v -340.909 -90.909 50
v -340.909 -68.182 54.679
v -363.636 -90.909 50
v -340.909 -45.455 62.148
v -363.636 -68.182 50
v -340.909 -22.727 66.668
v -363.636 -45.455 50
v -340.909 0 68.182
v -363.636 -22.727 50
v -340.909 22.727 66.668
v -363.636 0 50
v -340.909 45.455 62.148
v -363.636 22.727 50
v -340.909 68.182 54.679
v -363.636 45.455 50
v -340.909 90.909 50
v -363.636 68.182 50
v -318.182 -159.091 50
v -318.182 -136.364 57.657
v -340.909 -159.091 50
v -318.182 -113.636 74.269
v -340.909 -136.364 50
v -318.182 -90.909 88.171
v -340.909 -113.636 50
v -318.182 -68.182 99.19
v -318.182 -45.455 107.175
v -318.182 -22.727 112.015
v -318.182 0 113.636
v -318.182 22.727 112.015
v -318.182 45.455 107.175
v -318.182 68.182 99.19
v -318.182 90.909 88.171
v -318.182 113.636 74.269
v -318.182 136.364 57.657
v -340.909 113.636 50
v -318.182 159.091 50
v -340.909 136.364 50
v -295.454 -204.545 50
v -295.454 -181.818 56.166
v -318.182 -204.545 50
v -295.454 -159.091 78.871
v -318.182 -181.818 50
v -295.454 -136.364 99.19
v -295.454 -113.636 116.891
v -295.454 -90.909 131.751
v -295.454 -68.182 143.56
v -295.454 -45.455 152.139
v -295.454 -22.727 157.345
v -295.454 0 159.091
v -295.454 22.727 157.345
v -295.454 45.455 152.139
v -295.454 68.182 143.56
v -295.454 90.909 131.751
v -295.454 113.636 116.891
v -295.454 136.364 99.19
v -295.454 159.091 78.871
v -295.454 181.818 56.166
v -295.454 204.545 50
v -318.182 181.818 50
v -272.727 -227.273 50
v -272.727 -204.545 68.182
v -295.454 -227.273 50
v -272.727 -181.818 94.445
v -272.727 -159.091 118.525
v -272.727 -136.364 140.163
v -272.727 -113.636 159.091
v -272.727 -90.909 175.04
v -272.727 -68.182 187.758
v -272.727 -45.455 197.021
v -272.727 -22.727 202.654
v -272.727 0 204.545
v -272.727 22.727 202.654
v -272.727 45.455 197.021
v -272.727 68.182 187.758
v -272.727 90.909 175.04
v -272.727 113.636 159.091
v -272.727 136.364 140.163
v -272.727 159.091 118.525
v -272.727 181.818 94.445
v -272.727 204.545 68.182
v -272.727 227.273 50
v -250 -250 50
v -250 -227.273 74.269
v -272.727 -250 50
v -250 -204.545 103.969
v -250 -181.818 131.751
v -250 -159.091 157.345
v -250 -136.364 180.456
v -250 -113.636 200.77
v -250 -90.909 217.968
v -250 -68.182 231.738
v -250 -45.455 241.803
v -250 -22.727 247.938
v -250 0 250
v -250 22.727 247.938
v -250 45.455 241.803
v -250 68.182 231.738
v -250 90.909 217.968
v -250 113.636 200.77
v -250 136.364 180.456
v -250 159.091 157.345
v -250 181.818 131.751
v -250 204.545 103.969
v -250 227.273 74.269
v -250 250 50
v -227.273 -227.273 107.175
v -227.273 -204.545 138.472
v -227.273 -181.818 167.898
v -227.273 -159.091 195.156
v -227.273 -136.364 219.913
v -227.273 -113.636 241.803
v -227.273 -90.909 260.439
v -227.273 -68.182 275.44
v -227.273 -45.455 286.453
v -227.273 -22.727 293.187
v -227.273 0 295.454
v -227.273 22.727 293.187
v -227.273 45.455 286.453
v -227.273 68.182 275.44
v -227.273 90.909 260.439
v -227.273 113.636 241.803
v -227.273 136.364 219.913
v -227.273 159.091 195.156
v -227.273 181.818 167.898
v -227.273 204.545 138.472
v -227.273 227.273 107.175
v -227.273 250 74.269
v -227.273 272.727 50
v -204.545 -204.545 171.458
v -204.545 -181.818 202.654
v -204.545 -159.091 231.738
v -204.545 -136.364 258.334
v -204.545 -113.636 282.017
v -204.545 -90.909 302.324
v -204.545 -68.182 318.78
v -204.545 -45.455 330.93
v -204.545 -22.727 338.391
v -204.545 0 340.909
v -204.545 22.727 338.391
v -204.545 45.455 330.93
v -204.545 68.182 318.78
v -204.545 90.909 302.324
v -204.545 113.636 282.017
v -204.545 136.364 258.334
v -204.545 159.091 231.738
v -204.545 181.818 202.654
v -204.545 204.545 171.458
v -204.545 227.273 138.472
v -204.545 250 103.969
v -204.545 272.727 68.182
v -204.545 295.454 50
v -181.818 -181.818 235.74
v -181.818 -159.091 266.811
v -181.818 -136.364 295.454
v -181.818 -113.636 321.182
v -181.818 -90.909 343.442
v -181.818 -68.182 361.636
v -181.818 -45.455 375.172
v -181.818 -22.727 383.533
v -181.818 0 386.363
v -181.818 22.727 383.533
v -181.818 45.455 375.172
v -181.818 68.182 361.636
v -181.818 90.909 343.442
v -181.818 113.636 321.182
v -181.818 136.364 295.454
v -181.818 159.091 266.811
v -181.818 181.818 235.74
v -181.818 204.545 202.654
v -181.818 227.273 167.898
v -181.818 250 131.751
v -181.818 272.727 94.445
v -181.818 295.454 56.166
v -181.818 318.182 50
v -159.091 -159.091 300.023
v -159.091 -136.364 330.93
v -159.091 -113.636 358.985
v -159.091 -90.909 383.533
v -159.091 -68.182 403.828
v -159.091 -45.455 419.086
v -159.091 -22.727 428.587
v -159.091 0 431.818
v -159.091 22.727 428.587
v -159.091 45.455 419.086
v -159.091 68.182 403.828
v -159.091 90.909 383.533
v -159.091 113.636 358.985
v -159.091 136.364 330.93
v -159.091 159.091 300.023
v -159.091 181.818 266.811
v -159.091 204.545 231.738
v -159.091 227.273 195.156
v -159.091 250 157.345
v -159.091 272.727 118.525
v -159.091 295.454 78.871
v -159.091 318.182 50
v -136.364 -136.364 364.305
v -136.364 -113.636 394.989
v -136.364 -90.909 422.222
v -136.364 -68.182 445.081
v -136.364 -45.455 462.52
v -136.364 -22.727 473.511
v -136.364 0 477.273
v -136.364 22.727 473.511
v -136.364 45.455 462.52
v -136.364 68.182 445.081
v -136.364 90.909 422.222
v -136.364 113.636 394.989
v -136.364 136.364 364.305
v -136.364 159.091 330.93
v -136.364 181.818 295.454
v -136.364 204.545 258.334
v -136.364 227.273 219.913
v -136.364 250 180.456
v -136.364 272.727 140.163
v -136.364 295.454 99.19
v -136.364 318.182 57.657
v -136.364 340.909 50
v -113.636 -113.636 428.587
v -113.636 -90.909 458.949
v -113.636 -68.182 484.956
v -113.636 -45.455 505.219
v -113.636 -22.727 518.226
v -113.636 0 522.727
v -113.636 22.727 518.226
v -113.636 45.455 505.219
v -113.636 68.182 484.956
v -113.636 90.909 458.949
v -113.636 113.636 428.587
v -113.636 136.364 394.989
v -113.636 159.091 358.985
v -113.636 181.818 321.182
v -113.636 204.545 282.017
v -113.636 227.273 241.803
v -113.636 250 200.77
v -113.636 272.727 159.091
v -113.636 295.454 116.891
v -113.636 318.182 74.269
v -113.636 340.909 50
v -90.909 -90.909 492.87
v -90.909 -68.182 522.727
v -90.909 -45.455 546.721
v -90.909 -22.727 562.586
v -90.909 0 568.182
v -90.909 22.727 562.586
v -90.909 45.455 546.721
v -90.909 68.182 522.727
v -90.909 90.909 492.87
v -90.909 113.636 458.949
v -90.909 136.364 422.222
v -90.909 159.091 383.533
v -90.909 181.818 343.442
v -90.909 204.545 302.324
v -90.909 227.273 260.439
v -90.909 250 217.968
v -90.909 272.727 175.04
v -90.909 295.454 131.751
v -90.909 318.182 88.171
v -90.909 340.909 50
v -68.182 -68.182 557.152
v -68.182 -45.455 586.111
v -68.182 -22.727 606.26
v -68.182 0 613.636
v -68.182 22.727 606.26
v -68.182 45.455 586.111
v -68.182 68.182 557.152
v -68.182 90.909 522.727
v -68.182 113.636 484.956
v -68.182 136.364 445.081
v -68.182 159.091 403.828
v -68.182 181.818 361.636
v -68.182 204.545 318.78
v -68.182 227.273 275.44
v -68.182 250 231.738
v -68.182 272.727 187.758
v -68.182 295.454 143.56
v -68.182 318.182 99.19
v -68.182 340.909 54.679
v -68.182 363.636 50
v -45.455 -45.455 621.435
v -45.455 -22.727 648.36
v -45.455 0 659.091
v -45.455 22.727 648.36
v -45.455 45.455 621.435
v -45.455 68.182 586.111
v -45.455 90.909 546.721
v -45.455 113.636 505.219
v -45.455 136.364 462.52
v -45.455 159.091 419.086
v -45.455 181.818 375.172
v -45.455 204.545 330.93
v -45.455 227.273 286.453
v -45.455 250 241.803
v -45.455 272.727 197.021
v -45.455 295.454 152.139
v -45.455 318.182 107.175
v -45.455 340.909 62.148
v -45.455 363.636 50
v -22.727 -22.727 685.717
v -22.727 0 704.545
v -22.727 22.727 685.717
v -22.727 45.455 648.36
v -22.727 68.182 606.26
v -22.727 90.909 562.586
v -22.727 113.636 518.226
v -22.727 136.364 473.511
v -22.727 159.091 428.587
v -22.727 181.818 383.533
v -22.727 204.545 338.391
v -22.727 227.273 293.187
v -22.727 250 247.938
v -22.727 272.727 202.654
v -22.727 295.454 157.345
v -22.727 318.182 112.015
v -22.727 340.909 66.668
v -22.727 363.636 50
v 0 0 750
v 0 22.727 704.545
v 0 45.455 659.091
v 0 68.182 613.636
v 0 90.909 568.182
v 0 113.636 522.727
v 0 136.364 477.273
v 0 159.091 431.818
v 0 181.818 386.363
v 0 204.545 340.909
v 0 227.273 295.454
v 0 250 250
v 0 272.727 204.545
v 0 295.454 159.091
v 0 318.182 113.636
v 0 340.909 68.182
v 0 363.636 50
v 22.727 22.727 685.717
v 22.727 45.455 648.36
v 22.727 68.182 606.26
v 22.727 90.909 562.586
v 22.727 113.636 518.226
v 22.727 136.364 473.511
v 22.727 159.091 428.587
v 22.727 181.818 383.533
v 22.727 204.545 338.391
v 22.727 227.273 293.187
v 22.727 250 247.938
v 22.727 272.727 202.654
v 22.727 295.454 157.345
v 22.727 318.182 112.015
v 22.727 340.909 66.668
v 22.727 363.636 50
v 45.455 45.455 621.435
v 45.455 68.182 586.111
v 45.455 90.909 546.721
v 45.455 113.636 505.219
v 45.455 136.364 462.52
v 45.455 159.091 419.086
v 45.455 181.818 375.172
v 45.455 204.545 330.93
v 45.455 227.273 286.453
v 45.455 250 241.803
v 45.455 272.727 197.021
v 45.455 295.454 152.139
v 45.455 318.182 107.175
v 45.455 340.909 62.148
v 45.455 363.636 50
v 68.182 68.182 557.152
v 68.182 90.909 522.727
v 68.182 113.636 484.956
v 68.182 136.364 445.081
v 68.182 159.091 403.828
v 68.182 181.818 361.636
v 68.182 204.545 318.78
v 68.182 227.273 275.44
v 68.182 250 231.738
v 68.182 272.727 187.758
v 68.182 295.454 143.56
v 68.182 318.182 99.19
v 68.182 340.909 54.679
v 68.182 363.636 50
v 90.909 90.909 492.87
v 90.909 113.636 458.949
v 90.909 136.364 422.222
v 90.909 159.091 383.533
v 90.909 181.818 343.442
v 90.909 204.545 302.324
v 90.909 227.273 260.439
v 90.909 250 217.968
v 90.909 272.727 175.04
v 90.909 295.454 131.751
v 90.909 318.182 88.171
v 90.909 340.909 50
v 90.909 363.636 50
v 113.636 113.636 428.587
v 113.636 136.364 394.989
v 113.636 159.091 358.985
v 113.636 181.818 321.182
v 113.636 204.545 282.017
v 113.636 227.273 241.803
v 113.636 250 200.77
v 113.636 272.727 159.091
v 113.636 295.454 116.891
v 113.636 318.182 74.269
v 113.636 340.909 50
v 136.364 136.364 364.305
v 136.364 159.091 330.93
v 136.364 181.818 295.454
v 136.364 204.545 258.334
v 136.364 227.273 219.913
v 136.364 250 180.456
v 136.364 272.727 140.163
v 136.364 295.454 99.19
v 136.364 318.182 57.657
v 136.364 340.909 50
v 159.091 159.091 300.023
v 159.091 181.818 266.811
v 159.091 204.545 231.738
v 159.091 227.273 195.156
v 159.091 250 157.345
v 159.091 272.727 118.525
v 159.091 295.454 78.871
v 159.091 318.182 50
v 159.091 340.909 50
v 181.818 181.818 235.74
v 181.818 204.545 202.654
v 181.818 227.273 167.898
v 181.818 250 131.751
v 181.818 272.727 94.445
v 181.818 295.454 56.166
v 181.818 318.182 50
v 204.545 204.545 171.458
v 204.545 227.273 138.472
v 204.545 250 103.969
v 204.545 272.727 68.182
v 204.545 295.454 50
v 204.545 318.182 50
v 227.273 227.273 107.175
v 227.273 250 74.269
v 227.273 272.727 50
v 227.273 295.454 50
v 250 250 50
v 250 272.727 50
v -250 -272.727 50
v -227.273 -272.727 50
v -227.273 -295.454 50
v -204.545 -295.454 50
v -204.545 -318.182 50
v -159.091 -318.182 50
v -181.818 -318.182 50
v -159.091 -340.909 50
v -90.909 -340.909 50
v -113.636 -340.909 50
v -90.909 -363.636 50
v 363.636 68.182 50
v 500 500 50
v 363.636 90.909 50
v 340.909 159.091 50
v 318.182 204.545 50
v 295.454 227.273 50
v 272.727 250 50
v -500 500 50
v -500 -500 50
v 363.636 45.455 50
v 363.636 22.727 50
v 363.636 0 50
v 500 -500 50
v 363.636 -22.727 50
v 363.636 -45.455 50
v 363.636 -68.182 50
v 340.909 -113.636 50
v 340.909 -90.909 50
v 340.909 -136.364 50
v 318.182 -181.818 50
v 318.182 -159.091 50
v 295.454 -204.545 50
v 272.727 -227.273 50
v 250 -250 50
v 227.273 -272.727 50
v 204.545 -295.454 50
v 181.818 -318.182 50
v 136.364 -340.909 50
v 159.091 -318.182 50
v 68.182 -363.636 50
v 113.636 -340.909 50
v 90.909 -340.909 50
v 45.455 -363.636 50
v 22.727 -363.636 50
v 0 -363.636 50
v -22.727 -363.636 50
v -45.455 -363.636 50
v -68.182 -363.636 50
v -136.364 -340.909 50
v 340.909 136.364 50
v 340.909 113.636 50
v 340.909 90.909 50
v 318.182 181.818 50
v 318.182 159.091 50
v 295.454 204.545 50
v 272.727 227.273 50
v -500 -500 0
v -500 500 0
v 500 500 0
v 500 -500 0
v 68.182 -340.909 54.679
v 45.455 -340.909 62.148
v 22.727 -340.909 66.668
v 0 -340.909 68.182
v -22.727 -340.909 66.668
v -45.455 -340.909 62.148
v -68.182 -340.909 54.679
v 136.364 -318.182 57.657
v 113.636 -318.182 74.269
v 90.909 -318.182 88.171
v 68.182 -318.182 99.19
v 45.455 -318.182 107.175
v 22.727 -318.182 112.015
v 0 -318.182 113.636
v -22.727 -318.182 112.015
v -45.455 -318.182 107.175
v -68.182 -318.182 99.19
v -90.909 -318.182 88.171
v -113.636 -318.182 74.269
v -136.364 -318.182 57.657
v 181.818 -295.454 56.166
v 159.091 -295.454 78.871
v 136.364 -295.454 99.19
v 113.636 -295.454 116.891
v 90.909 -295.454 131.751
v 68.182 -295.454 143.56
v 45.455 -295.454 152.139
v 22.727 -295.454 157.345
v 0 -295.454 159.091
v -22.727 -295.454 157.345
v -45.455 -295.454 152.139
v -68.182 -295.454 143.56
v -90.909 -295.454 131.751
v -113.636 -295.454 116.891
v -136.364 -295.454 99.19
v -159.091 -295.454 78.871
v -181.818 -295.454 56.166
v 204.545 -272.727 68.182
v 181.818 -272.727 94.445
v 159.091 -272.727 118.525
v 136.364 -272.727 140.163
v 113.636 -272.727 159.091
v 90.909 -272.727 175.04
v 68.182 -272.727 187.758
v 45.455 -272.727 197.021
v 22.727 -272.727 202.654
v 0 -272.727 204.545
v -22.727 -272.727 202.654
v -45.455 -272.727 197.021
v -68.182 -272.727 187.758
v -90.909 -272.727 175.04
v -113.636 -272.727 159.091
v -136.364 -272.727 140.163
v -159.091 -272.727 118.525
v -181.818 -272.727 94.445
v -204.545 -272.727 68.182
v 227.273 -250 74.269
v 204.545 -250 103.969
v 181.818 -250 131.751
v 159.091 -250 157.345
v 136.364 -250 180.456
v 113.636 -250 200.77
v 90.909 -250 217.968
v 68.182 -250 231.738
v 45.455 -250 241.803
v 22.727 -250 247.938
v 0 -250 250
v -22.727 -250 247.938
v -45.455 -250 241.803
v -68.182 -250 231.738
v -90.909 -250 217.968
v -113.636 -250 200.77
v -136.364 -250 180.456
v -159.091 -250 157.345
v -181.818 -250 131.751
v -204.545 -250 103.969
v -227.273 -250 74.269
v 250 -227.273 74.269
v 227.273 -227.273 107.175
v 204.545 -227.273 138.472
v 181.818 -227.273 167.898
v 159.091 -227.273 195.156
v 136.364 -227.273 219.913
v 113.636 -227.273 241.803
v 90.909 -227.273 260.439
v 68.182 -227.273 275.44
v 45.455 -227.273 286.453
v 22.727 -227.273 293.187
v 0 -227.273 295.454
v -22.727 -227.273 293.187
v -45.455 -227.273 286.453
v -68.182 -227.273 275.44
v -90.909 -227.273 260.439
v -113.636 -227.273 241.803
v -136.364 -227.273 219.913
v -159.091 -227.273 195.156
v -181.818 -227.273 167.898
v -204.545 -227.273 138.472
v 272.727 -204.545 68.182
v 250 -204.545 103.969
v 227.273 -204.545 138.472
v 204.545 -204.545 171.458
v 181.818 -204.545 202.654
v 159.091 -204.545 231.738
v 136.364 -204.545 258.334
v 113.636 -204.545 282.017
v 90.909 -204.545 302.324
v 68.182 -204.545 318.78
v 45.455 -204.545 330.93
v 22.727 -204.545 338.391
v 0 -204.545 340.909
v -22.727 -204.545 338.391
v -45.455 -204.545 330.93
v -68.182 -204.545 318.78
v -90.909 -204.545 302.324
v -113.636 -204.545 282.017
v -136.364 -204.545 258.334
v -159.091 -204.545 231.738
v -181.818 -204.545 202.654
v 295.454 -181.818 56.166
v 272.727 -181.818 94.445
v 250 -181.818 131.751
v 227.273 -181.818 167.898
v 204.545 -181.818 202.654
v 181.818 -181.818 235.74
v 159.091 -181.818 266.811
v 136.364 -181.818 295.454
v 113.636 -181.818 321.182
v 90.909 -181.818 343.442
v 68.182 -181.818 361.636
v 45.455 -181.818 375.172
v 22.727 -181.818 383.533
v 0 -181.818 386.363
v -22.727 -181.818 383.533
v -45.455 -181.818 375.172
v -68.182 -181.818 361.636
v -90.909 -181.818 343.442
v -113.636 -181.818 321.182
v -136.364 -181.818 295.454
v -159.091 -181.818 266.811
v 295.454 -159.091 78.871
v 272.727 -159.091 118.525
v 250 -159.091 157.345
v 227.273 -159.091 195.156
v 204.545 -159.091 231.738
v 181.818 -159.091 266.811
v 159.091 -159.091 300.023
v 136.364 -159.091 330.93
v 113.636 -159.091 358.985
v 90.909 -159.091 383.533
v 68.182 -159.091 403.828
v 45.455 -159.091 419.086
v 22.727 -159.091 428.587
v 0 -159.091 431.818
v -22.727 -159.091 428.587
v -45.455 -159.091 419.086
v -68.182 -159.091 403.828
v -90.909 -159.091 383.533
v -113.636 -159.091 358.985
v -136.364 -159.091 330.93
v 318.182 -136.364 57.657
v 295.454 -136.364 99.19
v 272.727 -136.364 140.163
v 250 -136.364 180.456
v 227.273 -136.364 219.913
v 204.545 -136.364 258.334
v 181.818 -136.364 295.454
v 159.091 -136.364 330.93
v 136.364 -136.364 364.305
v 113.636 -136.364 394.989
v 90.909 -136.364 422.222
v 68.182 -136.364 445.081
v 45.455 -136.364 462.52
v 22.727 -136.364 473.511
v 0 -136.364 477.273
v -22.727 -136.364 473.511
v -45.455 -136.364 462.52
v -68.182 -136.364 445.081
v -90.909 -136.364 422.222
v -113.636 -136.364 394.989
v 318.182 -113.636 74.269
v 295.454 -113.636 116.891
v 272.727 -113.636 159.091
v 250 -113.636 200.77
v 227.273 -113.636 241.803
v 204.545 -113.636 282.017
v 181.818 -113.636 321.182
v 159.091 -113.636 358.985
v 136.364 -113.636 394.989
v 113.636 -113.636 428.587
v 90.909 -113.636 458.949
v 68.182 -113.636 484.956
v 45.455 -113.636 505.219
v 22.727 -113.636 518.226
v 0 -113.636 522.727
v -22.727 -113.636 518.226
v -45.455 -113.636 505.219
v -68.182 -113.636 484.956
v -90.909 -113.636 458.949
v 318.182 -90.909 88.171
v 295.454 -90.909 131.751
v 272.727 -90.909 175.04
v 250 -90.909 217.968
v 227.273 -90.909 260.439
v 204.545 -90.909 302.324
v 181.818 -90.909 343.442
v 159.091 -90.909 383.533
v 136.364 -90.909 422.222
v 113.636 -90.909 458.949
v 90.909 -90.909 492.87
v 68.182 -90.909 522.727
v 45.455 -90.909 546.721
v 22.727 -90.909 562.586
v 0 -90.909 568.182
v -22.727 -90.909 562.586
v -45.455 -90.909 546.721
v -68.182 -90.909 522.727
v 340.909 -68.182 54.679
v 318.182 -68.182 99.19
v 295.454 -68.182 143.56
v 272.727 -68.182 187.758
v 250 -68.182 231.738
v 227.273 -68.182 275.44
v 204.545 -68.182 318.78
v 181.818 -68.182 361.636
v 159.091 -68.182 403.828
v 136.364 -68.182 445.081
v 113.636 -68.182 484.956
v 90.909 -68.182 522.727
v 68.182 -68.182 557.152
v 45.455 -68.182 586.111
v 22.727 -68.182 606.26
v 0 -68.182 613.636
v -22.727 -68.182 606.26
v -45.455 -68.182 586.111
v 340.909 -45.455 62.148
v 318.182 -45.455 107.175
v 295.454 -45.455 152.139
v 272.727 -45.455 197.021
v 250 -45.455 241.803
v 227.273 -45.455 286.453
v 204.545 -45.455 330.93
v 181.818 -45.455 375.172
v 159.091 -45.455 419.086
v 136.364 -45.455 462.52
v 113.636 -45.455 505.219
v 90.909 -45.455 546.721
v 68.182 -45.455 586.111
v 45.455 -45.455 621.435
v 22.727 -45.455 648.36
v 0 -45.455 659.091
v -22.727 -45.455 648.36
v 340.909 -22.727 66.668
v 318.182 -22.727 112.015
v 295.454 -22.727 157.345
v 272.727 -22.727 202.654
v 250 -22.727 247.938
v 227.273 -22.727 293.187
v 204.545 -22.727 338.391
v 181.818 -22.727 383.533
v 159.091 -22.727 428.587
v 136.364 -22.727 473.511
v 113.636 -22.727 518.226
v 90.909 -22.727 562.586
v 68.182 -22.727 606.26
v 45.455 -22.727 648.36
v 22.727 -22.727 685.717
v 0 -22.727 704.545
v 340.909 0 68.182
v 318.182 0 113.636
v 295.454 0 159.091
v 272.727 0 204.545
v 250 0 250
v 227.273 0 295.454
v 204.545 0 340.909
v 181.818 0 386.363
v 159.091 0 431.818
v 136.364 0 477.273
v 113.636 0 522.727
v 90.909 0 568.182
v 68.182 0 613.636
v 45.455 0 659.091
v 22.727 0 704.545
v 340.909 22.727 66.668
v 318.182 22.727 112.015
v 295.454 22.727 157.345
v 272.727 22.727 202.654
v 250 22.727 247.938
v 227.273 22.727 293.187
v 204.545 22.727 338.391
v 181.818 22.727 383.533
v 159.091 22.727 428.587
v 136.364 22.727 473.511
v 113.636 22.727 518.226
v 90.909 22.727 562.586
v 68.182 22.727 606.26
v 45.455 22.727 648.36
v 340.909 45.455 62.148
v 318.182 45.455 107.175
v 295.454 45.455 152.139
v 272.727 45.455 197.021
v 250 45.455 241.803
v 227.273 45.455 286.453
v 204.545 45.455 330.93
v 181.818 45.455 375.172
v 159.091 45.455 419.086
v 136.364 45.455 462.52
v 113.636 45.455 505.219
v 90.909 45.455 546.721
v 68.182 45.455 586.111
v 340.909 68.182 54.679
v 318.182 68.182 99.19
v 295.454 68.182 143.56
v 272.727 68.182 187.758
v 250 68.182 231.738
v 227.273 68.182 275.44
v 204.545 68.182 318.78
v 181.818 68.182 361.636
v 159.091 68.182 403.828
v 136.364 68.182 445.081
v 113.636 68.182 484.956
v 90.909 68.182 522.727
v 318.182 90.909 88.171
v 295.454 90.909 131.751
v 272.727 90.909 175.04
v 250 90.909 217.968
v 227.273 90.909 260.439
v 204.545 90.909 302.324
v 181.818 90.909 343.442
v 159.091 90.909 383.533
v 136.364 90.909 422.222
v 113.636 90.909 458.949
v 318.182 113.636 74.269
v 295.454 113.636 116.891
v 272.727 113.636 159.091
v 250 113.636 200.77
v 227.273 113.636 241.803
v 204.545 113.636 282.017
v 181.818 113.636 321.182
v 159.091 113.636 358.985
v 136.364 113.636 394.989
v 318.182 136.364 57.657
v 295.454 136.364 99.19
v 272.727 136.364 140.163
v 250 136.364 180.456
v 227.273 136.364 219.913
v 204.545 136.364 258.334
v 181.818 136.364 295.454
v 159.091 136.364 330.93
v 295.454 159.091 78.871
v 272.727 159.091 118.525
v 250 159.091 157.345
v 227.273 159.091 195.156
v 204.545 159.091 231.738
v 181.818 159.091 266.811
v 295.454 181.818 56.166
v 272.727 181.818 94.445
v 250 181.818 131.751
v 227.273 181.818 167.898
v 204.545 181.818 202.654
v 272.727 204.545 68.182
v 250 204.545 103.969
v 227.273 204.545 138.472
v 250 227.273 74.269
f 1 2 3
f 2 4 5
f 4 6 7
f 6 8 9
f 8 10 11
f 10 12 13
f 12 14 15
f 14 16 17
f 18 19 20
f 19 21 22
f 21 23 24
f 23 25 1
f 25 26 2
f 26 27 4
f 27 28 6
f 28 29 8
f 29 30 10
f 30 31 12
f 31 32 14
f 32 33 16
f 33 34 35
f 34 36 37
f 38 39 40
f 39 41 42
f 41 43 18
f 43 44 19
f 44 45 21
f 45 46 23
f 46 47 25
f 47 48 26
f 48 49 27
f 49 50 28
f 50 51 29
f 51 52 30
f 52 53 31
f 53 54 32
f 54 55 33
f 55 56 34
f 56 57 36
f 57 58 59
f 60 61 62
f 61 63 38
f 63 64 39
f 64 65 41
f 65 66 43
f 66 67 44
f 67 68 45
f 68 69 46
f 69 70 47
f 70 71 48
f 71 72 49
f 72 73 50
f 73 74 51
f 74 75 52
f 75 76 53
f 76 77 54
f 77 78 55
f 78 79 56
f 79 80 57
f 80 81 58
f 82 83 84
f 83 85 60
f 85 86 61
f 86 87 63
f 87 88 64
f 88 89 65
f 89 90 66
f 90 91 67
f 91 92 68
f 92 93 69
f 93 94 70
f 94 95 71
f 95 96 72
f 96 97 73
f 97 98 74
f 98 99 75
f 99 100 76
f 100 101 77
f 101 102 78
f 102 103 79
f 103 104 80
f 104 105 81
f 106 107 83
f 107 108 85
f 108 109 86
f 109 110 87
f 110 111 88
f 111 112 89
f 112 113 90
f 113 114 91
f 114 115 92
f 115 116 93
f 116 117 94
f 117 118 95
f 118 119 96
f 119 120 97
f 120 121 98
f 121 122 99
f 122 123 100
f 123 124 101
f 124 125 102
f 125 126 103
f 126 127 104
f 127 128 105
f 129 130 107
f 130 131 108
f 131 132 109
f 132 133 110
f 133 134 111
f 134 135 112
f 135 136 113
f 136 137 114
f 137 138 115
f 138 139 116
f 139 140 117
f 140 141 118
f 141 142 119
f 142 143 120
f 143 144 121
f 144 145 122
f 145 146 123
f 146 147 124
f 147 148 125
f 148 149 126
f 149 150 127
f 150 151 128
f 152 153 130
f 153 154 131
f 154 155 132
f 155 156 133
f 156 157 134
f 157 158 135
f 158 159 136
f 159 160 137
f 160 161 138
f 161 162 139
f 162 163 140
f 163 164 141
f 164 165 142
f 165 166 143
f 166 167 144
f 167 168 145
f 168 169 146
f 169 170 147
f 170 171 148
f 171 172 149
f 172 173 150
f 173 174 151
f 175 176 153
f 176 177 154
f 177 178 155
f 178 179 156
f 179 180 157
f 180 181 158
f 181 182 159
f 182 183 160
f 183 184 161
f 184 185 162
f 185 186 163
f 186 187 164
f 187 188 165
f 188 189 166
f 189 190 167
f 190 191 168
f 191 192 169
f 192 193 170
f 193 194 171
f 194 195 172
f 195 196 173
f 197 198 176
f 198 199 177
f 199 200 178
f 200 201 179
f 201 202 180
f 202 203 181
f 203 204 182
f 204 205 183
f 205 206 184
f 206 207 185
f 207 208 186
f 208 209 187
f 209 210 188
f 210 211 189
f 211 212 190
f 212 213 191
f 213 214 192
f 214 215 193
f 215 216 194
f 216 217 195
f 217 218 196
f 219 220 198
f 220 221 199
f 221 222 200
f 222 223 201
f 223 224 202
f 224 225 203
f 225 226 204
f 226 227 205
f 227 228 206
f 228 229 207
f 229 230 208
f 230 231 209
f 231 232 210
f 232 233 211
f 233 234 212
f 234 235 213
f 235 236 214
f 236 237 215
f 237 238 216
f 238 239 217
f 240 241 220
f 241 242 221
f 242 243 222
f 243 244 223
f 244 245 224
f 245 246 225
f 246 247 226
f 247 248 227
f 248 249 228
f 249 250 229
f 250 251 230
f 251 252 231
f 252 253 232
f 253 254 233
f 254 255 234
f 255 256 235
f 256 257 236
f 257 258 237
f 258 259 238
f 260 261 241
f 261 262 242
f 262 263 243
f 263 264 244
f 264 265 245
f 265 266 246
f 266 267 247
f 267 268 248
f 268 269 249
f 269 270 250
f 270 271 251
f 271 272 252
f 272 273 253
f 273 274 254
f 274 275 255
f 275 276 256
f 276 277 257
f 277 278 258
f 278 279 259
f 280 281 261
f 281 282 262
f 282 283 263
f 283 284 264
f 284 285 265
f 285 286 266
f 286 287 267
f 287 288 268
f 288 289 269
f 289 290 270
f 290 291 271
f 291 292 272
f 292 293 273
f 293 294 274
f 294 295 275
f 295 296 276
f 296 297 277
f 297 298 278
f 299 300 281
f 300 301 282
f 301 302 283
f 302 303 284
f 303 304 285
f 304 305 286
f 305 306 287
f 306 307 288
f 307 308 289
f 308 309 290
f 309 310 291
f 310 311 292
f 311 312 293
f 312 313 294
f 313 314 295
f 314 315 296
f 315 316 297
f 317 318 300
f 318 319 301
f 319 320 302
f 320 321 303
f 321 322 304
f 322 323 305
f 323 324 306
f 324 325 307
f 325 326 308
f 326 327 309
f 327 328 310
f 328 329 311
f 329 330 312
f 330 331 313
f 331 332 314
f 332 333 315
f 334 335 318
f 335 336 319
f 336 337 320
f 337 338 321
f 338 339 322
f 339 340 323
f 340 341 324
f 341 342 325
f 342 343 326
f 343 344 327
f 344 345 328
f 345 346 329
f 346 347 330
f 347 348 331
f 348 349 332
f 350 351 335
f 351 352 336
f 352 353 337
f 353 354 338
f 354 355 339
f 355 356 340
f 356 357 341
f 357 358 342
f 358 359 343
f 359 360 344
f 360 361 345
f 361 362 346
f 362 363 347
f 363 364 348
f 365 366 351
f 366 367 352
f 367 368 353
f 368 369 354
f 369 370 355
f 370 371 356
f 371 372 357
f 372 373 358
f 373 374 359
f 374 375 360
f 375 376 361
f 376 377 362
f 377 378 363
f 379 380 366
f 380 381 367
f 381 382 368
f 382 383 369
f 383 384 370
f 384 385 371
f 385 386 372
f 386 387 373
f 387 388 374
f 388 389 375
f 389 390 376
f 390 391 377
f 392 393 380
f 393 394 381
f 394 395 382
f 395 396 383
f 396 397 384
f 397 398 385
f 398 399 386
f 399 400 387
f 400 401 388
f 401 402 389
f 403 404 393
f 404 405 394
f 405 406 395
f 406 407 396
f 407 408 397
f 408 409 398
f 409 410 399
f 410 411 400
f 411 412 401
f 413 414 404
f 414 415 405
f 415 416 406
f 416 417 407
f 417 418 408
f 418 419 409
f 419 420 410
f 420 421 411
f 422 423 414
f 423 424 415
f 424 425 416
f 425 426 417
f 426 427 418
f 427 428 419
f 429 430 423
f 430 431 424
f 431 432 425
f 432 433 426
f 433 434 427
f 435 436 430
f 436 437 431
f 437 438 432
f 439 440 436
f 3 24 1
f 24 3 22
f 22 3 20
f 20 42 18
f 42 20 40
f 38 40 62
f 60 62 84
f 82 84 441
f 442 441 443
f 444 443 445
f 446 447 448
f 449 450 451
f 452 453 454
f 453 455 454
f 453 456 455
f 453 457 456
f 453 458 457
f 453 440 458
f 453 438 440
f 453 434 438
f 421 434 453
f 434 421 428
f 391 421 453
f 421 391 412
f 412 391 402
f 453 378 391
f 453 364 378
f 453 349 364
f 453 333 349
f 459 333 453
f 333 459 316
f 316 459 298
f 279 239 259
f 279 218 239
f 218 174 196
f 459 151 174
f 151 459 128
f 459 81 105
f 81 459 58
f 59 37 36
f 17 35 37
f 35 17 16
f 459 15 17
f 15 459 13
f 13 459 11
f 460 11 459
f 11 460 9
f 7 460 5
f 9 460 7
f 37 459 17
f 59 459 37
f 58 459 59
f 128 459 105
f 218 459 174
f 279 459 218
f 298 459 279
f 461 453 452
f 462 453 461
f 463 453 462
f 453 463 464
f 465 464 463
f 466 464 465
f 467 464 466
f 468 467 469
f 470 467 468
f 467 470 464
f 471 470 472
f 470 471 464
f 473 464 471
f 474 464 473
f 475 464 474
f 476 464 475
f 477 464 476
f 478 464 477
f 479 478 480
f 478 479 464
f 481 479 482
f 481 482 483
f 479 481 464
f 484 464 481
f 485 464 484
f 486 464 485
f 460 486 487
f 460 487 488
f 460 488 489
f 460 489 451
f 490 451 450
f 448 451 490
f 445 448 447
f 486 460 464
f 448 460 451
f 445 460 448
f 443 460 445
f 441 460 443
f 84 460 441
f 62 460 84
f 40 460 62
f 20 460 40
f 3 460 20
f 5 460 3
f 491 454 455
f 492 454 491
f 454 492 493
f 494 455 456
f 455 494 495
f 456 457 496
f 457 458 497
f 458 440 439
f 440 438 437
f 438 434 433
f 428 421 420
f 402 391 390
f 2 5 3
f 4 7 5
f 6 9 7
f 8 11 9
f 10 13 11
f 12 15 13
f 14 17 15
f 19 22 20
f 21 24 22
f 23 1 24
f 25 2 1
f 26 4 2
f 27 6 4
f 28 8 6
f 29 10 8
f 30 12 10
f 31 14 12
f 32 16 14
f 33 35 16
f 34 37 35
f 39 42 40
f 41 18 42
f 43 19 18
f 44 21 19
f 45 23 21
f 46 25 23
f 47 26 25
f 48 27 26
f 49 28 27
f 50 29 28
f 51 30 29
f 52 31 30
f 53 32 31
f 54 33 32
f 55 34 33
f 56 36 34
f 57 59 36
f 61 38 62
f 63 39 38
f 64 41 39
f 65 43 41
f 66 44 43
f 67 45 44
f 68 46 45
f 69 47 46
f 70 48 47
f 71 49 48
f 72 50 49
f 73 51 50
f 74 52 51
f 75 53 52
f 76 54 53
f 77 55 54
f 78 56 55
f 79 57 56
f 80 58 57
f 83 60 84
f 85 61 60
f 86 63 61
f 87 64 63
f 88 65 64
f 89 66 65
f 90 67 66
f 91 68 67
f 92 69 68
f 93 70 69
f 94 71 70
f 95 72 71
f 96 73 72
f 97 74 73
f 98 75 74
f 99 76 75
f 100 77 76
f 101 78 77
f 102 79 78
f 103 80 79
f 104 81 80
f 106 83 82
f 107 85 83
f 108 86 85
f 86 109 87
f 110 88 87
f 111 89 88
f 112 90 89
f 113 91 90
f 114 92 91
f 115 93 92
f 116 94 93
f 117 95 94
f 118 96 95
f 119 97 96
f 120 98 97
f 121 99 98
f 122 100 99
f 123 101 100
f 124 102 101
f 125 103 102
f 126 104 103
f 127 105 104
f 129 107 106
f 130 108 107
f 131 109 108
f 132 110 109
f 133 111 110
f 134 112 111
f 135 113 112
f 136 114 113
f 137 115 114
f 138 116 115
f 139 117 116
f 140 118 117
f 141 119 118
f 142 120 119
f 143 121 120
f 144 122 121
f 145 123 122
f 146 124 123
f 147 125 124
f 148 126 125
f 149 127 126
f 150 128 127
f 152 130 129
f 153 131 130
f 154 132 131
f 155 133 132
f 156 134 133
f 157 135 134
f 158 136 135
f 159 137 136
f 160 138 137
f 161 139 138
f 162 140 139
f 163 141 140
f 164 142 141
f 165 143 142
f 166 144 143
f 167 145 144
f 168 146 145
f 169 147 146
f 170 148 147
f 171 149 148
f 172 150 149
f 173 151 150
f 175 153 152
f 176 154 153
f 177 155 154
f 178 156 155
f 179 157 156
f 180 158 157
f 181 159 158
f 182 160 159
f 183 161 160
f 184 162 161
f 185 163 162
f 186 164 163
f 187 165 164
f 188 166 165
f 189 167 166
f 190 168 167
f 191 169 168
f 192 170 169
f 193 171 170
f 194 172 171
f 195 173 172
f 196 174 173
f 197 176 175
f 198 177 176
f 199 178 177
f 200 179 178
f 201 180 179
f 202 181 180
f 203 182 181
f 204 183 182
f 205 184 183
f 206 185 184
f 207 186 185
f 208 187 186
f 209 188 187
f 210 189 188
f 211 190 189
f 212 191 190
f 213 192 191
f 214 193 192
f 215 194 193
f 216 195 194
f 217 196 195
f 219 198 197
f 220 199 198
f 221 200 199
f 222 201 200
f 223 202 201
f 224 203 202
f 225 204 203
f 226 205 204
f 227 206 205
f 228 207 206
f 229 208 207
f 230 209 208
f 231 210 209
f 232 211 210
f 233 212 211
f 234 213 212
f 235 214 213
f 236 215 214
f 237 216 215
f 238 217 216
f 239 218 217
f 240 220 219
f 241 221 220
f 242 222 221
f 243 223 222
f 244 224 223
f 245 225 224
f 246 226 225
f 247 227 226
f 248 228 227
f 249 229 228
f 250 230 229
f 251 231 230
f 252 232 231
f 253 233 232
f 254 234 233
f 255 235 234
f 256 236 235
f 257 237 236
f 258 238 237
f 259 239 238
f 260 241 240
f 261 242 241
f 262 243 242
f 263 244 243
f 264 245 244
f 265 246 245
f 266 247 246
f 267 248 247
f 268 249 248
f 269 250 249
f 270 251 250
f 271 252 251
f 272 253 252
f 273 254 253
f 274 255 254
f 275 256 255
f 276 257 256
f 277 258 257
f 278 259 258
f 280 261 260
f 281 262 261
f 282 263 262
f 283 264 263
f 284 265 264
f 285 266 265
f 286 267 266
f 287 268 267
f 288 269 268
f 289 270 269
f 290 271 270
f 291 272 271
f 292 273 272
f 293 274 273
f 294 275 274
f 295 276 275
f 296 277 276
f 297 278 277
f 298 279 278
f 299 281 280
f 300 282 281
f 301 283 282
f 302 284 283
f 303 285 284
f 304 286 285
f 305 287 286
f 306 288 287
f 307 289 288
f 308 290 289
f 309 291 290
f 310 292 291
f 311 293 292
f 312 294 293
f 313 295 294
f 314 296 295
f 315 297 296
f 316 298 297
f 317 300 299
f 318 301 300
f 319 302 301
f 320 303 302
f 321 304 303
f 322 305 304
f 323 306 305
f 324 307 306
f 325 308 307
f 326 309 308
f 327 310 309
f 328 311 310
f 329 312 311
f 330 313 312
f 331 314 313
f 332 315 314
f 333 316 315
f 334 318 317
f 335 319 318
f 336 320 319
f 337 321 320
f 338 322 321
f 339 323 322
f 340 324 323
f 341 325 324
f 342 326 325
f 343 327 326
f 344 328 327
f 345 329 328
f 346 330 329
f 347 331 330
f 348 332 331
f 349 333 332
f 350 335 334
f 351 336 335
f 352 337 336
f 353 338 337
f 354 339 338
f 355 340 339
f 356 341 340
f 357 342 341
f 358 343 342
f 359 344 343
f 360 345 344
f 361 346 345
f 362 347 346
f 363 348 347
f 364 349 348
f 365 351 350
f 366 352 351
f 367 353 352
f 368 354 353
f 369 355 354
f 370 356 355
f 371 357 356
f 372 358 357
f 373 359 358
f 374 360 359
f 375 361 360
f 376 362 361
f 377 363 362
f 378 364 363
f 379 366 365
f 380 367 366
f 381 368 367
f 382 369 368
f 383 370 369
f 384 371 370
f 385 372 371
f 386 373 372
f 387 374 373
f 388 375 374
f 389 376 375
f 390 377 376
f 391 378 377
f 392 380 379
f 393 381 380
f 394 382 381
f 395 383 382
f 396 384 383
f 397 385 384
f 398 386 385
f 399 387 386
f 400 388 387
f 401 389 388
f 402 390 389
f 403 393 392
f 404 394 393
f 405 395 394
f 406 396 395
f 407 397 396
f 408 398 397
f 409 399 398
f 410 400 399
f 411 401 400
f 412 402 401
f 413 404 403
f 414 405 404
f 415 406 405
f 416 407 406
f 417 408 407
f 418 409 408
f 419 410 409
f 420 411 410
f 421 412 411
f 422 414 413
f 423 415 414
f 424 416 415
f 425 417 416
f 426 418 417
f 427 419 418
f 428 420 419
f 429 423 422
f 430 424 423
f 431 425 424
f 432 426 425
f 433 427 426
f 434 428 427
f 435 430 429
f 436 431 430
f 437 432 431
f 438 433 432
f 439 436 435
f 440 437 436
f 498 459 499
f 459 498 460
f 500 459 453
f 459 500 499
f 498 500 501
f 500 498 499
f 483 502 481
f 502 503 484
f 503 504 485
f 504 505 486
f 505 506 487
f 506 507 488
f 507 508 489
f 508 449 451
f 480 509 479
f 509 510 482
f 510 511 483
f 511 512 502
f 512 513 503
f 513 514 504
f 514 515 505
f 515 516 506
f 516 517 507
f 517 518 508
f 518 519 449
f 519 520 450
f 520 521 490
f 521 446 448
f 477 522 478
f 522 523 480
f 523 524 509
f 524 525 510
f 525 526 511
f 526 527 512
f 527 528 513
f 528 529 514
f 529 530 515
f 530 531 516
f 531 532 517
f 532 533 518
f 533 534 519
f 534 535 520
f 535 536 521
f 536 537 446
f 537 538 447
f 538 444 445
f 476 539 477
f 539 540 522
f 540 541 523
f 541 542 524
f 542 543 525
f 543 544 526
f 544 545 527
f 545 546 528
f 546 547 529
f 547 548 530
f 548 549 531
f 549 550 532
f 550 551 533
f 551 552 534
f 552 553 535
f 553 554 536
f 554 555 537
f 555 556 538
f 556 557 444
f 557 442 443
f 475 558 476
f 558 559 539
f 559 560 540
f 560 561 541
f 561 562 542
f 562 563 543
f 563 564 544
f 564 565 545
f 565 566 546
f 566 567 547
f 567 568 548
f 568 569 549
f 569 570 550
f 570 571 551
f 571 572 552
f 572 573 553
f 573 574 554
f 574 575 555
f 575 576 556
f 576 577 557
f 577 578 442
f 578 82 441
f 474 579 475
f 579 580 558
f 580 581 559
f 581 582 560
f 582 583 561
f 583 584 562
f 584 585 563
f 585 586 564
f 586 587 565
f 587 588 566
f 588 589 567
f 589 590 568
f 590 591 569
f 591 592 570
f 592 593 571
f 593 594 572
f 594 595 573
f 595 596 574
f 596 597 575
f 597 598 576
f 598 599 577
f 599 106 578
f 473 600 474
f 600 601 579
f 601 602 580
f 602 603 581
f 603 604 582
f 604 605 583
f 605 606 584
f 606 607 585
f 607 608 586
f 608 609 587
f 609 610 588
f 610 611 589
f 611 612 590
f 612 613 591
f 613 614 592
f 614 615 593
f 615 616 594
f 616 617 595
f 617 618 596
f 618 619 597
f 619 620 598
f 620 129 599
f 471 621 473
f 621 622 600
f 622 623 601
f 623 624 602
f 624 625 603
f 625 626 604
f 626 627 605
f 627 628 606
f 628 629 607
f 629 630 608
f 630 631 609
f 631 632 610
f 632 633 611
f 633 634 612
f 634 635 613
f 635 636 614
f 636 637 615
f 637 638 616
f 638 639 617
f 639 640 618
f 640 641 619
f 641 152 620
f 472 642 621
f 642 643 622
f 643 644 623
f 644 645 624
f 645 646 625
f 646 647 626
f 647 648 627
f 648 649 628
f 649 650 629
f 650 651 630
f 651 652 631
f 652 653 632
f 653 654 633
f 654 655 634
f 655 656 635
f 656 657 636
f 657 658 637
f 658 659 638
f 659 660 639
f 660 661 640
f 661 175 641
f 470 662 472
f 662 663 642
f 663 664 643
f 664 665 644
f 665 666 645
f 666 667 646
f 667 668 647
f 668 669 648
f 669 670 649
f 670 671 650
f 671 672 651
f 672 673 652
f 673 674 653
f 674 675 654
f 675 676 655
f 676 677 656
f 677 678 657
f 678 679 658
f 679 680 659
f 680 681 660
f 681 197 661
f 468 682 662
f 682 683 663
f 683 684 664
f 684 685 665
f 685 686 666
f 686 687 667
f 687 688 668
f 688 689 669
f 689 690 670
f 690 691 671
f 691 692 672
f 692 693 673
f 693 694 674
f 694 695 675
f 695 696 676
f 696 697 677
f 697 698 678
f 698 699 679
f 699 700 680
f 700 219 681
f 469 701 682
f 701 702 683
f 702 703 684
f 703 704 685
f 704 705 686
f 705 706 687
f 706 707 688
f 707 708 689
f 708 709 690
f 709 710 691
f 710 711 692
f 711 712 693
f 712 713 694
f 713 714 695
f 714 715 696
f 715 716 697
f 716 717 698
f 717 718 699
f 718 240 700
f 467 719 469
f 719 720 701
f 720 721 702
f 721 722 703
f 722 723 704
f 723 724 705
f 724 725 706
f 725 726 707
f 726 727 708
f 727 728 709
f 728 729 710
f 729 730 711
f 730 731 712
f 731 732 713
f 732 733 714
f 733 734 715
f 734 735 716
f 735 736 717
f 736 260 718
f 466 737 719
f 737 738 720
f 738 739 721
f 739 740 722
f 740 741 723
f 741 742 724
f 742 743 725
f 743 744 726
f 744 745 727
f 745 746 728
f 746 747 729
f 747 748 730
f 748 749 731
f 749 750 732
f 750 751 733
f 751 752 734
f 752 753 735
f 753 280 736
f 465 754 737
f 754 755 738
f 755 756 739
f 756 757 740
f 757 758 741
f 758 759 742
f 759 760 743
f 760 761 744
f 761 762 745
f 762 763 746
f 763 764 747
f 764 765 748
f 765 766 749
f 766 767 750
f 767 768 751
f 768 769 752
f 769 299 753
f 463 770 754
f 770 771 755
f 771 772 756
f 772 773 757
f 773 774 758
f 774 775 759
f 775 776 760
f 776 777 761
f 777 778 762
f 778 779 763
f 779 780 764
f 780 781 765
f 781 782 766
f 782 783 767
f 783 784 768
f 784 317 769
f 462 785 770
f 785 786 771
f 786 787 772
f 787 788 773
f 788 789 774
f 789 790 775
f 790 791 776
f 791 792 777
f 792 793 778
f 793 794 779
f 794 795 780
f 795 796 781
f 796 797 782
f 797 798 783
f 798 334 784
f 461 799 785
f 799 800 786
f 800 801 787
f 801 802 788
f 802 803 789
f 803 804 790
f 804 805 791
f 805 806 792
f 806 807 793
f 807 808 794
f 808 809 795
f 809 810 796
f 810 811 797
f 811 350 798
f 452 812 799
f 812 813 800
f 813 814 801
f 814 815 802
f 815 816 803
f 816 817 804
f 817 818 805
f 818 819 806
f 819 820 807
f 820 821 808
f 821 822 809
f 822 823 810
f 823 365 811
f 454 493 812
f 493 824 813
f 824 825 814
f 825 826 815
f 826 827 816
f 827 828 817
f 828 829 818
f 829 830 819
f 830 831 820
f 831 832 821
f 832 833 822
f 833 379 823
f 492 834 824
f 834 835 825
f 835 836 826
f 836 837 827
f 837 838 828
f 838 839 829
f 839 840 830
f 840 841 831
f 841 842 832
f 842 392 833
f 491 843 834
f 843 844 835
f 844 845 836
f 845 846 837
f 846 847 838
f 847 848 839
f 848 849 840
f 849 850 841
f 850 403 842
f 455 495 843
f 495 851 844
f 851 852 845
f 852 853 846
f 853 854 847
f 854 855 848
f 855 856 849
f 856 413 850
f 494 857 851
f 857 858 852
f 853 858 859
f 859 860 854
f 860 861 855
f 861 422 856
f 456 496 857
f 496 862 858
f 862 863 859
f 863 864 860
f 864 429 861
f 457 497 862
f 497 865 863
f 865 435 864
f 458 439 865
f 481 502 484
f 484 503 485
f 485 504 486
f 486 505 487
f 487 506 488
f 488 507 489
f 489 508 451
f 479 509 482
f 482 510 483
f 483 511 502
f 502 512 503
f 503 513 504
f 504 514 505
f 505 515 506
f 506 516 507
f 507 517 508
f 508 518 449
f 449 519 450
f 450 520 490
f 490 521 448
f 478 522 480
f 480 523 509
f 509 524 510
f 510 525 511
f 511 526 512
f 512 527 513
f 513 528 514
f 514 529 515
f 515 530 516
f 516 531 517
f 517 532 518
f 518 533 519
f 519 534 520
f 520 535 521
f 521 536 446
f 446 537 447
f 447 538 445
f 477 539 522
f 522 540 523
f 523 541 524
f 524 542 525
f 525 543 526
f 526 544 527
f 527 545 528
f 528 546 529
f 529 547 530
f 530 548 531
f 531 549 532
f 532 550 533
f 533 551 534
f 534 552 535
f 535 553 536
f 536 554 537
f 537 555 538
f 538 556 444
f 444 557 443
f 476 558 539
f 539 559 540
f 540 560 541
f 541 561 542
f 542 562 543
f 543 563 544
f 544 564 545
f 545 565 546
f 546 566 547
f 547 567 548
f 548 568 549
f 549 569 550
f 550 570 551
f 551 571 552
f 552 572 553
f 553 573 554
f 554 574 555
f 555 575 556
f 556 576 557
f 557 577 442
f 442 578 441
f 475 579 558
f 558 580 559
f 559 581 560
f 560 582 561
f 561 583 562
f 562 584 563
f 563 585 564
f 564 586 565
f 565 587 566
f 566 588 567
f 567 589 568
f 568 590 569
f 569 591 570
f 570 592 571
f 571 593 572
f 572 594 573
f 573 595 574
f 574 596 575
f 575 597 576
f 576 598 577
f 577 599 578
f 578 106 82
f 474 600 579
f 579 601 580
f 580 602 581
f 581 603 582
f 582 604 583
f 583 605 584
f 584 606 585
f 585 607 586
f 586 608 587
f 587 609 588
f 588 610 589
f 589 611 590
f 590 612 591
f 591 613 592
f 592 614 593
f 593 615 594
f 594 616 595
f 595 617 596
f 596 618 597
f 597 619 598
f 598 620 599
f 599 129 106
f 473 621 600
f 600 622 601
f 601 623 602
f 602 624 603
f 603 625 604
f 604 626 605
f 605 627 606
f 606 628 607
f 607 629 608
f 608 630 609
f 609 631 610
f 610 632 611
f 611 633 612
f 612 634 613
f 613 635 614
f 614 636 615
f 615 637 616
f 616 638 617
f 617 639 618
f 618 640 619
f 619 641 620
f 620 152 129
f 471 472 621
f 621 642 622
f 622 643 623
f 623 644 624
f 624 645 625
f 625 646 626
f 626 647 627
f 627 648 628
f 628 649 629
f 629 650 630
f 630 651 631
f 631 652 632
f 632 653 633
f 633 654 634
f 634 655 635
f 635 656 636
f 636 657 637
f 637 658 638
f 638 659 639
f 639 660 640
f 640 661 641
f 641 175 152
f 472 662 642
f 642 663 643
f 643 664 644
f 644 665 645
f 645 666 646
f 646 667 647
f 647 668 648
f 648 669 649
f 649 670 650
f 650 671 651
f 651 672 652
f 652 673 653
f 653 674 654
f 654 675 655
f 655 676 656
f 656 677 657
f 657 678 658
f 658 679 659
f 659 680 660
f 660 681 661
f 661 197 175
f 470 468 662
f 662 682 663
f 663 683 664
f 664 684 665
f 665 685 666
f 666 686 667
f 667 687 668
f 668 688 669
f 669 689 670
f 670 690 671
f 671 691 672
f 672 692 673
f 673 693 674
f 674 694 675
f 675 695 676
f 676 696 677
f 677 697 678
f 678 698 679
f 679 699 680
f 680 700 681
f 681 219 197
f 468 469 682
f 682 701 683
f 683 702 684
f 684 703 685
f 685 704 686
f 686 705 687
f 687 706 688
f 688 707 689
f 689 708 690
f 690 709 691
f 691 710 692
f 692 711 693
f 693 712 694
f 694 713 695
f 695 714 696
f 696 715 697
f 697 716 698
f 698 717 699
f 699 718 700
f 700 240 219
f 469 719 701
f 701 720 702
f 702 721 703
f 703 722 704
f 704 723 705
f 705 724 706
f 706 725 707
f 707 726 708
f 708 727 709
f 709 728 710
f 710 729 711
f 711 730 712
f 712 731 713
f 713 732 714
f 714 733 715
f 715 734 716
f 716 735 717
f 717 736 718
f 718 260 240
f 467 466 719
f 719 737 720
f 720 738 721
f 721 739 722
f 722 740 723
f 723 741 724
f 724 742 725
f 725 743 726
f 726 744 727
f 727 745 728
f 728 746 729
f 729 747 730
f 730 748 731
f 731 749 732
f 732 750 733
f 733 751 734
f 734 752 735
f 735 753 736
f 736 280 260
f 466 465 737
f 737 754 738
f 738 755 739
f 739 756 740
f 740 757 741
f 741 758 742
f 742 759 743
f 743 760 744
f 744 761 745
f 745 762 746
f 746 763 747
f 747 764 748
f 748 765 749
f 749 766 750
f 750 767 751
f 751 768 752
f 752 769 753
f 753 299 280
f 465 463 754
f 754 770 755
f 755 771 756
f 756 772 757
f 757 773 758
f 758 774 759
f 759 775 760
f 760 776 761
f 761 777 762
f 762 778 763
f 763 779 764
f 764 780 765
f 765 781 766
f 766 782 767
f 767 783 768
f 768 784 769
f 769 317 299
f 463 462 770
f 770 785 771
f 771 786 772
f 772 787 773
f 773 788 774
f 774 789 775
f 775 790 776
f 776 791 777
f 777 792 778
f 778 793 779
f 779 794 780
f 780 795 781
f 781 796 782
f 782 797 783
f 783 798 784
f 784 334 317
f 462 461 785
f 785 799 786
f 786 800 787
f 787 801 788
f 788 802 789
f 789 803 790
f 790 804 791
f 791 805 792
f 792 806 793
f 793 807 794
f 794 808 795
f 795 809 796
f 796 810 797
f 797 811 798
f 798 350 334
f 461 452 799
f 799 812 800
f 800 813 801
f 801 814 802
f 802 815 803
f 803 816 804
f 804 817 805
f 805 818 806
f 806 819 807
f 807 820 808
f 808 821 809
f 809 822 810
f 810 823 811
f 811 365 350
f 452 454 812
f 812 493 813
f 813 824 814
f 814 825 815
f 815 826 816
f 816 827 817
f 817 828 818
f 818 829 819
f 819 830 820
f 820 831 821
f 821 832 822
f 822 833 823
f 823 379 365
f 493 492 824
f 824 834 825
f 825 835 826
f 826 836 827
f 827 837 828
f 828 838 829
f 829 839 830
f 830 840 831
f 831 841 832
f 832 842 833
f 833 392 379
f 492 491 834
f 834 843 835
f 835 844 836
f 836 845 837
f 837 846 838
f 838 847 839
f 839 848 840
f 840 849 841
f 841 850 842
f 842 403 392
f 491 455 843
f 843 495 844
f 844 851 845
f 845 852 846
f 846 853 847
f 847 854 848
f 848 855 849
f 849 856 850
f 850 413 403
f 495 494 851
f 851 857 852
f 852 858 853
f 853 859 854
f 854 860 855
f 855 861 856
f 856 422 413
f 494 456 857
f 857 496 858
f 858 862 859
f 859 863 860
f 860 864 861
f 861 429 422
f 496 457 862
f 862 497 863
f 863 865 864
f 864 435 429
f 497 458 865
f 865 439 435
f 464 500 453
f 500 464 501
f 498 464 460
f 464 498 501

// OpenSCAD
///////////////////////////////////////////////////////////////////
//
// plot
// ====
//
// This module draws a polyhedron mapping a function greater than zero.
// The domain of the function may be either a triangle or a quadrilateral.
// The function is evaluated in a triangular grid of points inside its domain 
// and its graph is ploted. 
//
//    module plot(m,p0,p1,p2,p3=undef,conv=10)
//
// where the parameters are:
//
//    m         - the approximate number of points in the grid for each
//                triangular domain; quadrilaterals will have 2*m points
//    p0,p1,p2  - the three 2D points of the triangular domain
//    p3        - the third point of a second triangular domain (p0,p2,p3);
//                if p3 is undef, just the first triangular domain is used
//    conv      - convexity parameter of the polihedra
//
// The module requires an external function to be plotted:
//
//    function map_to_plot(x,y)
//
// which should return either a real value or undef for each real x and y. 
//
////////////////////////////////////////////////////////////////////

module plot(m, p0, p1, p2, p3=undef, conv=10){
  
  N = ceil( sqrt( 2 * m) - 3/2 );
  
  // the main task
  union(){
    plot_tri(p0, p1, p2);
    if (p3 != undef)
      plot_tri(p0, p2, p3);
  }
  
 // module to plot in a triangular domain
  module plot_tri(p0, p1, p2) {
    
    // the three domain points should be in anti-clockwise order
    A =  p0;
    B = (p1-p0) * (p2-p0) < 0 ? p2 : p1;
    C = (B==p1) ? p2 : p1;
    
    // the indexed points in the grid
    function meshPoint(i,j) = A*i/N + B*j/N + C*(N-i-j)/N;

    // functions to enumerate the points with defined values of the map_to_plot
    function shrinked(a) = 
      [for (i=[0:N], j=[0:N-i]) if(a[i][j][2] != undef) a[i][j] ];
        
    function enum(a) = let(b = shrinked(a))
      [for (i=[0:N]) 
        [ for (j=[0:N-i])
          (a[i][j][2] != undef)? 
            [for ( k = search(a[i][j], b, 0)[0]) if (a[i][j] == b[k]) k ][0]:
            undef
      ]];
  
     // the vertices in the grid
    map = [ for (i=[0:N])
          [ for (j=[0:N-i])
            let(x = meshPoint(i,j)[0], y = meshPoint(i,j)[1])
              [ x, y, map_to_plot(x,y)] 
          ]];

    emap = enum(map);
          
    // the points in the top of the plot
    toppts = [ for(i=[0:N], j=[0:N-i])  if(emap[i][j] != undef) map[i][j] ];

    // the points in the base of the plot
    botpts = [ for (pts = toppts)[ pts[0], pts[1], 0 ] ];
      
    // the faces in the top of the plot
    top_tri_faces = 
      concat( 
        [for(i=[1:N], j=[0:N-i]) 
          if( (emap[i][j]   !=undef) && 
              (emap[i-1][j] !=undef) && 
              (emap[i][j-1] !=undef) ) 
                [ emap[i][j], emap[i][j-1], emap[i-1][j] ]],

        [for(i=[0:N-1], j=[0:N-i]) 
          if( (emap[i][j]     !=undef) && 
              (emap[i][j-1]   !=undef) && 
              (emap[i+1][j-1] !=undef)) 
                [ emap[i][j], emap[i+1][j-1], emap[i][j-1] ]] 
       );
          
    // the faces in the base of the plot
    base_tri_faces = let(k = len(toppts))
        [ for(face = top_tri_faces) [ face[1]+k, face[0]+k, face[2]+k ] ];

    // enumeration of the vertices of vertical quadrilateral faces of the plot
    // faces with constant j :   10 00 1-1 01 
    function side_faces1(a) = let (k = len(toppts))
        [for(i=[0:N-1], j=[0:N-i])
          let (p = (a[ i ][ j ] != undef) && (a[i+1][ j ] != undef),
               q = (a[i+1][j-1] == undef) && (a[ i ][j+1] != undef),
               r = (a[i+1][j-1] != undef) && (a[ i ][j+1] == undef) )
          if ( p  && ( q || r ) ) q ?
            [ a[ i ][j], a[i+1][j], a[i+1][j]+k, a[ i ][j]+k ] :
            [ a[i+1][j], a[ i ][j], a[ i ][j]+k, a[i+1][j]+k ]
        ];

    // faces with constant i :  00 01  10  -11
    function side_faces2(a) = let (k = len(toppts))
        [for(i=[0:N-1], j=[0:N-i])
          let (p = (a[ i ][j] != undef) && (a[ i ][j+1] != undef),
               q = (a[i+1][j] == undef) && (a[i-1][j+1] != undef),
               r = (a[i+1][j] != undef) && (a[i-1][j+1] == undef) )
          if ( p  && ( q || r ) ) q ?
            [ a[i][ j ], a[i][j+1], a[i][j+1]+k, a[i][ j ]+k ]:
            [ a[i][j+1], a[i][ j ], a[i][ j ]+k, a[i][j+1]+k ]
        ];

    // faces with constant N-i-j :   00  1-1  10 0-1 
    function side_faces3(a) = let (k = len(toppts))
        [for(i=[0:N-1], j=[0:N-i])
          let (p = (a[ i ][j] != undef) && (a[i+1][j-1] != undef),
               q = (a[i+1][j] == undef) && (a[ i ][j-1] != undef),
               r = (a[i+1][j] != undef) && (a[ i ][j-1] == undef) )
          if ( p  && ( q || r ) ) q ?
            [ a[i+1][j-1], a[ i ][ j ], a[ i ][ j ]+k, a[i+1][j-1]+k ]:
            [ a[ i ][ j ], a[i+1][j-1], a[i+1][j-1]+k, a[ i ][ j ]+k ]
         ];

    side_faces = 
          concat( side_faces1(emap), side_faces2(emap), side_faces3(emap));
                 
    polyhedron(
        points = concat(toppts, botpts),
        faces  = concat(top_tri_faces, side_faces, base_tri_faces),
        convexity = conv);
  }
}

// examples of usage
// function map_to_plot(x,y) = abs(x*x+y*y+3*x)<170? 0.1*(-x*x + y*y)+20: undef;
// plot(1000,[10,0], [-10,10], [-10,-10], [10,-20]);
//
// function map_to_plot(x,y) = 20+12*exp(-0.006*abs(x*x+y*y))*cos(1.5*(x*x+y*y));



// XXX Define your stuff here XXX
function f(x,y) =  1.5-2*sqrt(x*x+y*y); //1.5-2*sqrt(x*x+y*y);
size_of_base_in_milimeters = 1000;
resolution = 1000; //higher numbers produce a better result




function map_to_plot(x,y) = f(x,y) > .1 ? f(x,y) : .1;
scale([size_of_base_in_milimeters/2,size_of_base_in_milimeters/2,size_of_base_in_milimeters/2]) plot(resolution, [1,1], [-1,1], [-1,-1], [1,-1]);
 //plot(750,[20,0], [20,40], [-20,20]);
//
// function map_to_plot(x,y) = 10 + 0.005*(x*x*y - 3*x*y)+ ((rands(0,2,1)[0]<0.7)? rands(0,0.02*y,1)[0]: 0);
// plot(700, [10,-10], [10,10], [-10,10], [-10,-10]);
 
